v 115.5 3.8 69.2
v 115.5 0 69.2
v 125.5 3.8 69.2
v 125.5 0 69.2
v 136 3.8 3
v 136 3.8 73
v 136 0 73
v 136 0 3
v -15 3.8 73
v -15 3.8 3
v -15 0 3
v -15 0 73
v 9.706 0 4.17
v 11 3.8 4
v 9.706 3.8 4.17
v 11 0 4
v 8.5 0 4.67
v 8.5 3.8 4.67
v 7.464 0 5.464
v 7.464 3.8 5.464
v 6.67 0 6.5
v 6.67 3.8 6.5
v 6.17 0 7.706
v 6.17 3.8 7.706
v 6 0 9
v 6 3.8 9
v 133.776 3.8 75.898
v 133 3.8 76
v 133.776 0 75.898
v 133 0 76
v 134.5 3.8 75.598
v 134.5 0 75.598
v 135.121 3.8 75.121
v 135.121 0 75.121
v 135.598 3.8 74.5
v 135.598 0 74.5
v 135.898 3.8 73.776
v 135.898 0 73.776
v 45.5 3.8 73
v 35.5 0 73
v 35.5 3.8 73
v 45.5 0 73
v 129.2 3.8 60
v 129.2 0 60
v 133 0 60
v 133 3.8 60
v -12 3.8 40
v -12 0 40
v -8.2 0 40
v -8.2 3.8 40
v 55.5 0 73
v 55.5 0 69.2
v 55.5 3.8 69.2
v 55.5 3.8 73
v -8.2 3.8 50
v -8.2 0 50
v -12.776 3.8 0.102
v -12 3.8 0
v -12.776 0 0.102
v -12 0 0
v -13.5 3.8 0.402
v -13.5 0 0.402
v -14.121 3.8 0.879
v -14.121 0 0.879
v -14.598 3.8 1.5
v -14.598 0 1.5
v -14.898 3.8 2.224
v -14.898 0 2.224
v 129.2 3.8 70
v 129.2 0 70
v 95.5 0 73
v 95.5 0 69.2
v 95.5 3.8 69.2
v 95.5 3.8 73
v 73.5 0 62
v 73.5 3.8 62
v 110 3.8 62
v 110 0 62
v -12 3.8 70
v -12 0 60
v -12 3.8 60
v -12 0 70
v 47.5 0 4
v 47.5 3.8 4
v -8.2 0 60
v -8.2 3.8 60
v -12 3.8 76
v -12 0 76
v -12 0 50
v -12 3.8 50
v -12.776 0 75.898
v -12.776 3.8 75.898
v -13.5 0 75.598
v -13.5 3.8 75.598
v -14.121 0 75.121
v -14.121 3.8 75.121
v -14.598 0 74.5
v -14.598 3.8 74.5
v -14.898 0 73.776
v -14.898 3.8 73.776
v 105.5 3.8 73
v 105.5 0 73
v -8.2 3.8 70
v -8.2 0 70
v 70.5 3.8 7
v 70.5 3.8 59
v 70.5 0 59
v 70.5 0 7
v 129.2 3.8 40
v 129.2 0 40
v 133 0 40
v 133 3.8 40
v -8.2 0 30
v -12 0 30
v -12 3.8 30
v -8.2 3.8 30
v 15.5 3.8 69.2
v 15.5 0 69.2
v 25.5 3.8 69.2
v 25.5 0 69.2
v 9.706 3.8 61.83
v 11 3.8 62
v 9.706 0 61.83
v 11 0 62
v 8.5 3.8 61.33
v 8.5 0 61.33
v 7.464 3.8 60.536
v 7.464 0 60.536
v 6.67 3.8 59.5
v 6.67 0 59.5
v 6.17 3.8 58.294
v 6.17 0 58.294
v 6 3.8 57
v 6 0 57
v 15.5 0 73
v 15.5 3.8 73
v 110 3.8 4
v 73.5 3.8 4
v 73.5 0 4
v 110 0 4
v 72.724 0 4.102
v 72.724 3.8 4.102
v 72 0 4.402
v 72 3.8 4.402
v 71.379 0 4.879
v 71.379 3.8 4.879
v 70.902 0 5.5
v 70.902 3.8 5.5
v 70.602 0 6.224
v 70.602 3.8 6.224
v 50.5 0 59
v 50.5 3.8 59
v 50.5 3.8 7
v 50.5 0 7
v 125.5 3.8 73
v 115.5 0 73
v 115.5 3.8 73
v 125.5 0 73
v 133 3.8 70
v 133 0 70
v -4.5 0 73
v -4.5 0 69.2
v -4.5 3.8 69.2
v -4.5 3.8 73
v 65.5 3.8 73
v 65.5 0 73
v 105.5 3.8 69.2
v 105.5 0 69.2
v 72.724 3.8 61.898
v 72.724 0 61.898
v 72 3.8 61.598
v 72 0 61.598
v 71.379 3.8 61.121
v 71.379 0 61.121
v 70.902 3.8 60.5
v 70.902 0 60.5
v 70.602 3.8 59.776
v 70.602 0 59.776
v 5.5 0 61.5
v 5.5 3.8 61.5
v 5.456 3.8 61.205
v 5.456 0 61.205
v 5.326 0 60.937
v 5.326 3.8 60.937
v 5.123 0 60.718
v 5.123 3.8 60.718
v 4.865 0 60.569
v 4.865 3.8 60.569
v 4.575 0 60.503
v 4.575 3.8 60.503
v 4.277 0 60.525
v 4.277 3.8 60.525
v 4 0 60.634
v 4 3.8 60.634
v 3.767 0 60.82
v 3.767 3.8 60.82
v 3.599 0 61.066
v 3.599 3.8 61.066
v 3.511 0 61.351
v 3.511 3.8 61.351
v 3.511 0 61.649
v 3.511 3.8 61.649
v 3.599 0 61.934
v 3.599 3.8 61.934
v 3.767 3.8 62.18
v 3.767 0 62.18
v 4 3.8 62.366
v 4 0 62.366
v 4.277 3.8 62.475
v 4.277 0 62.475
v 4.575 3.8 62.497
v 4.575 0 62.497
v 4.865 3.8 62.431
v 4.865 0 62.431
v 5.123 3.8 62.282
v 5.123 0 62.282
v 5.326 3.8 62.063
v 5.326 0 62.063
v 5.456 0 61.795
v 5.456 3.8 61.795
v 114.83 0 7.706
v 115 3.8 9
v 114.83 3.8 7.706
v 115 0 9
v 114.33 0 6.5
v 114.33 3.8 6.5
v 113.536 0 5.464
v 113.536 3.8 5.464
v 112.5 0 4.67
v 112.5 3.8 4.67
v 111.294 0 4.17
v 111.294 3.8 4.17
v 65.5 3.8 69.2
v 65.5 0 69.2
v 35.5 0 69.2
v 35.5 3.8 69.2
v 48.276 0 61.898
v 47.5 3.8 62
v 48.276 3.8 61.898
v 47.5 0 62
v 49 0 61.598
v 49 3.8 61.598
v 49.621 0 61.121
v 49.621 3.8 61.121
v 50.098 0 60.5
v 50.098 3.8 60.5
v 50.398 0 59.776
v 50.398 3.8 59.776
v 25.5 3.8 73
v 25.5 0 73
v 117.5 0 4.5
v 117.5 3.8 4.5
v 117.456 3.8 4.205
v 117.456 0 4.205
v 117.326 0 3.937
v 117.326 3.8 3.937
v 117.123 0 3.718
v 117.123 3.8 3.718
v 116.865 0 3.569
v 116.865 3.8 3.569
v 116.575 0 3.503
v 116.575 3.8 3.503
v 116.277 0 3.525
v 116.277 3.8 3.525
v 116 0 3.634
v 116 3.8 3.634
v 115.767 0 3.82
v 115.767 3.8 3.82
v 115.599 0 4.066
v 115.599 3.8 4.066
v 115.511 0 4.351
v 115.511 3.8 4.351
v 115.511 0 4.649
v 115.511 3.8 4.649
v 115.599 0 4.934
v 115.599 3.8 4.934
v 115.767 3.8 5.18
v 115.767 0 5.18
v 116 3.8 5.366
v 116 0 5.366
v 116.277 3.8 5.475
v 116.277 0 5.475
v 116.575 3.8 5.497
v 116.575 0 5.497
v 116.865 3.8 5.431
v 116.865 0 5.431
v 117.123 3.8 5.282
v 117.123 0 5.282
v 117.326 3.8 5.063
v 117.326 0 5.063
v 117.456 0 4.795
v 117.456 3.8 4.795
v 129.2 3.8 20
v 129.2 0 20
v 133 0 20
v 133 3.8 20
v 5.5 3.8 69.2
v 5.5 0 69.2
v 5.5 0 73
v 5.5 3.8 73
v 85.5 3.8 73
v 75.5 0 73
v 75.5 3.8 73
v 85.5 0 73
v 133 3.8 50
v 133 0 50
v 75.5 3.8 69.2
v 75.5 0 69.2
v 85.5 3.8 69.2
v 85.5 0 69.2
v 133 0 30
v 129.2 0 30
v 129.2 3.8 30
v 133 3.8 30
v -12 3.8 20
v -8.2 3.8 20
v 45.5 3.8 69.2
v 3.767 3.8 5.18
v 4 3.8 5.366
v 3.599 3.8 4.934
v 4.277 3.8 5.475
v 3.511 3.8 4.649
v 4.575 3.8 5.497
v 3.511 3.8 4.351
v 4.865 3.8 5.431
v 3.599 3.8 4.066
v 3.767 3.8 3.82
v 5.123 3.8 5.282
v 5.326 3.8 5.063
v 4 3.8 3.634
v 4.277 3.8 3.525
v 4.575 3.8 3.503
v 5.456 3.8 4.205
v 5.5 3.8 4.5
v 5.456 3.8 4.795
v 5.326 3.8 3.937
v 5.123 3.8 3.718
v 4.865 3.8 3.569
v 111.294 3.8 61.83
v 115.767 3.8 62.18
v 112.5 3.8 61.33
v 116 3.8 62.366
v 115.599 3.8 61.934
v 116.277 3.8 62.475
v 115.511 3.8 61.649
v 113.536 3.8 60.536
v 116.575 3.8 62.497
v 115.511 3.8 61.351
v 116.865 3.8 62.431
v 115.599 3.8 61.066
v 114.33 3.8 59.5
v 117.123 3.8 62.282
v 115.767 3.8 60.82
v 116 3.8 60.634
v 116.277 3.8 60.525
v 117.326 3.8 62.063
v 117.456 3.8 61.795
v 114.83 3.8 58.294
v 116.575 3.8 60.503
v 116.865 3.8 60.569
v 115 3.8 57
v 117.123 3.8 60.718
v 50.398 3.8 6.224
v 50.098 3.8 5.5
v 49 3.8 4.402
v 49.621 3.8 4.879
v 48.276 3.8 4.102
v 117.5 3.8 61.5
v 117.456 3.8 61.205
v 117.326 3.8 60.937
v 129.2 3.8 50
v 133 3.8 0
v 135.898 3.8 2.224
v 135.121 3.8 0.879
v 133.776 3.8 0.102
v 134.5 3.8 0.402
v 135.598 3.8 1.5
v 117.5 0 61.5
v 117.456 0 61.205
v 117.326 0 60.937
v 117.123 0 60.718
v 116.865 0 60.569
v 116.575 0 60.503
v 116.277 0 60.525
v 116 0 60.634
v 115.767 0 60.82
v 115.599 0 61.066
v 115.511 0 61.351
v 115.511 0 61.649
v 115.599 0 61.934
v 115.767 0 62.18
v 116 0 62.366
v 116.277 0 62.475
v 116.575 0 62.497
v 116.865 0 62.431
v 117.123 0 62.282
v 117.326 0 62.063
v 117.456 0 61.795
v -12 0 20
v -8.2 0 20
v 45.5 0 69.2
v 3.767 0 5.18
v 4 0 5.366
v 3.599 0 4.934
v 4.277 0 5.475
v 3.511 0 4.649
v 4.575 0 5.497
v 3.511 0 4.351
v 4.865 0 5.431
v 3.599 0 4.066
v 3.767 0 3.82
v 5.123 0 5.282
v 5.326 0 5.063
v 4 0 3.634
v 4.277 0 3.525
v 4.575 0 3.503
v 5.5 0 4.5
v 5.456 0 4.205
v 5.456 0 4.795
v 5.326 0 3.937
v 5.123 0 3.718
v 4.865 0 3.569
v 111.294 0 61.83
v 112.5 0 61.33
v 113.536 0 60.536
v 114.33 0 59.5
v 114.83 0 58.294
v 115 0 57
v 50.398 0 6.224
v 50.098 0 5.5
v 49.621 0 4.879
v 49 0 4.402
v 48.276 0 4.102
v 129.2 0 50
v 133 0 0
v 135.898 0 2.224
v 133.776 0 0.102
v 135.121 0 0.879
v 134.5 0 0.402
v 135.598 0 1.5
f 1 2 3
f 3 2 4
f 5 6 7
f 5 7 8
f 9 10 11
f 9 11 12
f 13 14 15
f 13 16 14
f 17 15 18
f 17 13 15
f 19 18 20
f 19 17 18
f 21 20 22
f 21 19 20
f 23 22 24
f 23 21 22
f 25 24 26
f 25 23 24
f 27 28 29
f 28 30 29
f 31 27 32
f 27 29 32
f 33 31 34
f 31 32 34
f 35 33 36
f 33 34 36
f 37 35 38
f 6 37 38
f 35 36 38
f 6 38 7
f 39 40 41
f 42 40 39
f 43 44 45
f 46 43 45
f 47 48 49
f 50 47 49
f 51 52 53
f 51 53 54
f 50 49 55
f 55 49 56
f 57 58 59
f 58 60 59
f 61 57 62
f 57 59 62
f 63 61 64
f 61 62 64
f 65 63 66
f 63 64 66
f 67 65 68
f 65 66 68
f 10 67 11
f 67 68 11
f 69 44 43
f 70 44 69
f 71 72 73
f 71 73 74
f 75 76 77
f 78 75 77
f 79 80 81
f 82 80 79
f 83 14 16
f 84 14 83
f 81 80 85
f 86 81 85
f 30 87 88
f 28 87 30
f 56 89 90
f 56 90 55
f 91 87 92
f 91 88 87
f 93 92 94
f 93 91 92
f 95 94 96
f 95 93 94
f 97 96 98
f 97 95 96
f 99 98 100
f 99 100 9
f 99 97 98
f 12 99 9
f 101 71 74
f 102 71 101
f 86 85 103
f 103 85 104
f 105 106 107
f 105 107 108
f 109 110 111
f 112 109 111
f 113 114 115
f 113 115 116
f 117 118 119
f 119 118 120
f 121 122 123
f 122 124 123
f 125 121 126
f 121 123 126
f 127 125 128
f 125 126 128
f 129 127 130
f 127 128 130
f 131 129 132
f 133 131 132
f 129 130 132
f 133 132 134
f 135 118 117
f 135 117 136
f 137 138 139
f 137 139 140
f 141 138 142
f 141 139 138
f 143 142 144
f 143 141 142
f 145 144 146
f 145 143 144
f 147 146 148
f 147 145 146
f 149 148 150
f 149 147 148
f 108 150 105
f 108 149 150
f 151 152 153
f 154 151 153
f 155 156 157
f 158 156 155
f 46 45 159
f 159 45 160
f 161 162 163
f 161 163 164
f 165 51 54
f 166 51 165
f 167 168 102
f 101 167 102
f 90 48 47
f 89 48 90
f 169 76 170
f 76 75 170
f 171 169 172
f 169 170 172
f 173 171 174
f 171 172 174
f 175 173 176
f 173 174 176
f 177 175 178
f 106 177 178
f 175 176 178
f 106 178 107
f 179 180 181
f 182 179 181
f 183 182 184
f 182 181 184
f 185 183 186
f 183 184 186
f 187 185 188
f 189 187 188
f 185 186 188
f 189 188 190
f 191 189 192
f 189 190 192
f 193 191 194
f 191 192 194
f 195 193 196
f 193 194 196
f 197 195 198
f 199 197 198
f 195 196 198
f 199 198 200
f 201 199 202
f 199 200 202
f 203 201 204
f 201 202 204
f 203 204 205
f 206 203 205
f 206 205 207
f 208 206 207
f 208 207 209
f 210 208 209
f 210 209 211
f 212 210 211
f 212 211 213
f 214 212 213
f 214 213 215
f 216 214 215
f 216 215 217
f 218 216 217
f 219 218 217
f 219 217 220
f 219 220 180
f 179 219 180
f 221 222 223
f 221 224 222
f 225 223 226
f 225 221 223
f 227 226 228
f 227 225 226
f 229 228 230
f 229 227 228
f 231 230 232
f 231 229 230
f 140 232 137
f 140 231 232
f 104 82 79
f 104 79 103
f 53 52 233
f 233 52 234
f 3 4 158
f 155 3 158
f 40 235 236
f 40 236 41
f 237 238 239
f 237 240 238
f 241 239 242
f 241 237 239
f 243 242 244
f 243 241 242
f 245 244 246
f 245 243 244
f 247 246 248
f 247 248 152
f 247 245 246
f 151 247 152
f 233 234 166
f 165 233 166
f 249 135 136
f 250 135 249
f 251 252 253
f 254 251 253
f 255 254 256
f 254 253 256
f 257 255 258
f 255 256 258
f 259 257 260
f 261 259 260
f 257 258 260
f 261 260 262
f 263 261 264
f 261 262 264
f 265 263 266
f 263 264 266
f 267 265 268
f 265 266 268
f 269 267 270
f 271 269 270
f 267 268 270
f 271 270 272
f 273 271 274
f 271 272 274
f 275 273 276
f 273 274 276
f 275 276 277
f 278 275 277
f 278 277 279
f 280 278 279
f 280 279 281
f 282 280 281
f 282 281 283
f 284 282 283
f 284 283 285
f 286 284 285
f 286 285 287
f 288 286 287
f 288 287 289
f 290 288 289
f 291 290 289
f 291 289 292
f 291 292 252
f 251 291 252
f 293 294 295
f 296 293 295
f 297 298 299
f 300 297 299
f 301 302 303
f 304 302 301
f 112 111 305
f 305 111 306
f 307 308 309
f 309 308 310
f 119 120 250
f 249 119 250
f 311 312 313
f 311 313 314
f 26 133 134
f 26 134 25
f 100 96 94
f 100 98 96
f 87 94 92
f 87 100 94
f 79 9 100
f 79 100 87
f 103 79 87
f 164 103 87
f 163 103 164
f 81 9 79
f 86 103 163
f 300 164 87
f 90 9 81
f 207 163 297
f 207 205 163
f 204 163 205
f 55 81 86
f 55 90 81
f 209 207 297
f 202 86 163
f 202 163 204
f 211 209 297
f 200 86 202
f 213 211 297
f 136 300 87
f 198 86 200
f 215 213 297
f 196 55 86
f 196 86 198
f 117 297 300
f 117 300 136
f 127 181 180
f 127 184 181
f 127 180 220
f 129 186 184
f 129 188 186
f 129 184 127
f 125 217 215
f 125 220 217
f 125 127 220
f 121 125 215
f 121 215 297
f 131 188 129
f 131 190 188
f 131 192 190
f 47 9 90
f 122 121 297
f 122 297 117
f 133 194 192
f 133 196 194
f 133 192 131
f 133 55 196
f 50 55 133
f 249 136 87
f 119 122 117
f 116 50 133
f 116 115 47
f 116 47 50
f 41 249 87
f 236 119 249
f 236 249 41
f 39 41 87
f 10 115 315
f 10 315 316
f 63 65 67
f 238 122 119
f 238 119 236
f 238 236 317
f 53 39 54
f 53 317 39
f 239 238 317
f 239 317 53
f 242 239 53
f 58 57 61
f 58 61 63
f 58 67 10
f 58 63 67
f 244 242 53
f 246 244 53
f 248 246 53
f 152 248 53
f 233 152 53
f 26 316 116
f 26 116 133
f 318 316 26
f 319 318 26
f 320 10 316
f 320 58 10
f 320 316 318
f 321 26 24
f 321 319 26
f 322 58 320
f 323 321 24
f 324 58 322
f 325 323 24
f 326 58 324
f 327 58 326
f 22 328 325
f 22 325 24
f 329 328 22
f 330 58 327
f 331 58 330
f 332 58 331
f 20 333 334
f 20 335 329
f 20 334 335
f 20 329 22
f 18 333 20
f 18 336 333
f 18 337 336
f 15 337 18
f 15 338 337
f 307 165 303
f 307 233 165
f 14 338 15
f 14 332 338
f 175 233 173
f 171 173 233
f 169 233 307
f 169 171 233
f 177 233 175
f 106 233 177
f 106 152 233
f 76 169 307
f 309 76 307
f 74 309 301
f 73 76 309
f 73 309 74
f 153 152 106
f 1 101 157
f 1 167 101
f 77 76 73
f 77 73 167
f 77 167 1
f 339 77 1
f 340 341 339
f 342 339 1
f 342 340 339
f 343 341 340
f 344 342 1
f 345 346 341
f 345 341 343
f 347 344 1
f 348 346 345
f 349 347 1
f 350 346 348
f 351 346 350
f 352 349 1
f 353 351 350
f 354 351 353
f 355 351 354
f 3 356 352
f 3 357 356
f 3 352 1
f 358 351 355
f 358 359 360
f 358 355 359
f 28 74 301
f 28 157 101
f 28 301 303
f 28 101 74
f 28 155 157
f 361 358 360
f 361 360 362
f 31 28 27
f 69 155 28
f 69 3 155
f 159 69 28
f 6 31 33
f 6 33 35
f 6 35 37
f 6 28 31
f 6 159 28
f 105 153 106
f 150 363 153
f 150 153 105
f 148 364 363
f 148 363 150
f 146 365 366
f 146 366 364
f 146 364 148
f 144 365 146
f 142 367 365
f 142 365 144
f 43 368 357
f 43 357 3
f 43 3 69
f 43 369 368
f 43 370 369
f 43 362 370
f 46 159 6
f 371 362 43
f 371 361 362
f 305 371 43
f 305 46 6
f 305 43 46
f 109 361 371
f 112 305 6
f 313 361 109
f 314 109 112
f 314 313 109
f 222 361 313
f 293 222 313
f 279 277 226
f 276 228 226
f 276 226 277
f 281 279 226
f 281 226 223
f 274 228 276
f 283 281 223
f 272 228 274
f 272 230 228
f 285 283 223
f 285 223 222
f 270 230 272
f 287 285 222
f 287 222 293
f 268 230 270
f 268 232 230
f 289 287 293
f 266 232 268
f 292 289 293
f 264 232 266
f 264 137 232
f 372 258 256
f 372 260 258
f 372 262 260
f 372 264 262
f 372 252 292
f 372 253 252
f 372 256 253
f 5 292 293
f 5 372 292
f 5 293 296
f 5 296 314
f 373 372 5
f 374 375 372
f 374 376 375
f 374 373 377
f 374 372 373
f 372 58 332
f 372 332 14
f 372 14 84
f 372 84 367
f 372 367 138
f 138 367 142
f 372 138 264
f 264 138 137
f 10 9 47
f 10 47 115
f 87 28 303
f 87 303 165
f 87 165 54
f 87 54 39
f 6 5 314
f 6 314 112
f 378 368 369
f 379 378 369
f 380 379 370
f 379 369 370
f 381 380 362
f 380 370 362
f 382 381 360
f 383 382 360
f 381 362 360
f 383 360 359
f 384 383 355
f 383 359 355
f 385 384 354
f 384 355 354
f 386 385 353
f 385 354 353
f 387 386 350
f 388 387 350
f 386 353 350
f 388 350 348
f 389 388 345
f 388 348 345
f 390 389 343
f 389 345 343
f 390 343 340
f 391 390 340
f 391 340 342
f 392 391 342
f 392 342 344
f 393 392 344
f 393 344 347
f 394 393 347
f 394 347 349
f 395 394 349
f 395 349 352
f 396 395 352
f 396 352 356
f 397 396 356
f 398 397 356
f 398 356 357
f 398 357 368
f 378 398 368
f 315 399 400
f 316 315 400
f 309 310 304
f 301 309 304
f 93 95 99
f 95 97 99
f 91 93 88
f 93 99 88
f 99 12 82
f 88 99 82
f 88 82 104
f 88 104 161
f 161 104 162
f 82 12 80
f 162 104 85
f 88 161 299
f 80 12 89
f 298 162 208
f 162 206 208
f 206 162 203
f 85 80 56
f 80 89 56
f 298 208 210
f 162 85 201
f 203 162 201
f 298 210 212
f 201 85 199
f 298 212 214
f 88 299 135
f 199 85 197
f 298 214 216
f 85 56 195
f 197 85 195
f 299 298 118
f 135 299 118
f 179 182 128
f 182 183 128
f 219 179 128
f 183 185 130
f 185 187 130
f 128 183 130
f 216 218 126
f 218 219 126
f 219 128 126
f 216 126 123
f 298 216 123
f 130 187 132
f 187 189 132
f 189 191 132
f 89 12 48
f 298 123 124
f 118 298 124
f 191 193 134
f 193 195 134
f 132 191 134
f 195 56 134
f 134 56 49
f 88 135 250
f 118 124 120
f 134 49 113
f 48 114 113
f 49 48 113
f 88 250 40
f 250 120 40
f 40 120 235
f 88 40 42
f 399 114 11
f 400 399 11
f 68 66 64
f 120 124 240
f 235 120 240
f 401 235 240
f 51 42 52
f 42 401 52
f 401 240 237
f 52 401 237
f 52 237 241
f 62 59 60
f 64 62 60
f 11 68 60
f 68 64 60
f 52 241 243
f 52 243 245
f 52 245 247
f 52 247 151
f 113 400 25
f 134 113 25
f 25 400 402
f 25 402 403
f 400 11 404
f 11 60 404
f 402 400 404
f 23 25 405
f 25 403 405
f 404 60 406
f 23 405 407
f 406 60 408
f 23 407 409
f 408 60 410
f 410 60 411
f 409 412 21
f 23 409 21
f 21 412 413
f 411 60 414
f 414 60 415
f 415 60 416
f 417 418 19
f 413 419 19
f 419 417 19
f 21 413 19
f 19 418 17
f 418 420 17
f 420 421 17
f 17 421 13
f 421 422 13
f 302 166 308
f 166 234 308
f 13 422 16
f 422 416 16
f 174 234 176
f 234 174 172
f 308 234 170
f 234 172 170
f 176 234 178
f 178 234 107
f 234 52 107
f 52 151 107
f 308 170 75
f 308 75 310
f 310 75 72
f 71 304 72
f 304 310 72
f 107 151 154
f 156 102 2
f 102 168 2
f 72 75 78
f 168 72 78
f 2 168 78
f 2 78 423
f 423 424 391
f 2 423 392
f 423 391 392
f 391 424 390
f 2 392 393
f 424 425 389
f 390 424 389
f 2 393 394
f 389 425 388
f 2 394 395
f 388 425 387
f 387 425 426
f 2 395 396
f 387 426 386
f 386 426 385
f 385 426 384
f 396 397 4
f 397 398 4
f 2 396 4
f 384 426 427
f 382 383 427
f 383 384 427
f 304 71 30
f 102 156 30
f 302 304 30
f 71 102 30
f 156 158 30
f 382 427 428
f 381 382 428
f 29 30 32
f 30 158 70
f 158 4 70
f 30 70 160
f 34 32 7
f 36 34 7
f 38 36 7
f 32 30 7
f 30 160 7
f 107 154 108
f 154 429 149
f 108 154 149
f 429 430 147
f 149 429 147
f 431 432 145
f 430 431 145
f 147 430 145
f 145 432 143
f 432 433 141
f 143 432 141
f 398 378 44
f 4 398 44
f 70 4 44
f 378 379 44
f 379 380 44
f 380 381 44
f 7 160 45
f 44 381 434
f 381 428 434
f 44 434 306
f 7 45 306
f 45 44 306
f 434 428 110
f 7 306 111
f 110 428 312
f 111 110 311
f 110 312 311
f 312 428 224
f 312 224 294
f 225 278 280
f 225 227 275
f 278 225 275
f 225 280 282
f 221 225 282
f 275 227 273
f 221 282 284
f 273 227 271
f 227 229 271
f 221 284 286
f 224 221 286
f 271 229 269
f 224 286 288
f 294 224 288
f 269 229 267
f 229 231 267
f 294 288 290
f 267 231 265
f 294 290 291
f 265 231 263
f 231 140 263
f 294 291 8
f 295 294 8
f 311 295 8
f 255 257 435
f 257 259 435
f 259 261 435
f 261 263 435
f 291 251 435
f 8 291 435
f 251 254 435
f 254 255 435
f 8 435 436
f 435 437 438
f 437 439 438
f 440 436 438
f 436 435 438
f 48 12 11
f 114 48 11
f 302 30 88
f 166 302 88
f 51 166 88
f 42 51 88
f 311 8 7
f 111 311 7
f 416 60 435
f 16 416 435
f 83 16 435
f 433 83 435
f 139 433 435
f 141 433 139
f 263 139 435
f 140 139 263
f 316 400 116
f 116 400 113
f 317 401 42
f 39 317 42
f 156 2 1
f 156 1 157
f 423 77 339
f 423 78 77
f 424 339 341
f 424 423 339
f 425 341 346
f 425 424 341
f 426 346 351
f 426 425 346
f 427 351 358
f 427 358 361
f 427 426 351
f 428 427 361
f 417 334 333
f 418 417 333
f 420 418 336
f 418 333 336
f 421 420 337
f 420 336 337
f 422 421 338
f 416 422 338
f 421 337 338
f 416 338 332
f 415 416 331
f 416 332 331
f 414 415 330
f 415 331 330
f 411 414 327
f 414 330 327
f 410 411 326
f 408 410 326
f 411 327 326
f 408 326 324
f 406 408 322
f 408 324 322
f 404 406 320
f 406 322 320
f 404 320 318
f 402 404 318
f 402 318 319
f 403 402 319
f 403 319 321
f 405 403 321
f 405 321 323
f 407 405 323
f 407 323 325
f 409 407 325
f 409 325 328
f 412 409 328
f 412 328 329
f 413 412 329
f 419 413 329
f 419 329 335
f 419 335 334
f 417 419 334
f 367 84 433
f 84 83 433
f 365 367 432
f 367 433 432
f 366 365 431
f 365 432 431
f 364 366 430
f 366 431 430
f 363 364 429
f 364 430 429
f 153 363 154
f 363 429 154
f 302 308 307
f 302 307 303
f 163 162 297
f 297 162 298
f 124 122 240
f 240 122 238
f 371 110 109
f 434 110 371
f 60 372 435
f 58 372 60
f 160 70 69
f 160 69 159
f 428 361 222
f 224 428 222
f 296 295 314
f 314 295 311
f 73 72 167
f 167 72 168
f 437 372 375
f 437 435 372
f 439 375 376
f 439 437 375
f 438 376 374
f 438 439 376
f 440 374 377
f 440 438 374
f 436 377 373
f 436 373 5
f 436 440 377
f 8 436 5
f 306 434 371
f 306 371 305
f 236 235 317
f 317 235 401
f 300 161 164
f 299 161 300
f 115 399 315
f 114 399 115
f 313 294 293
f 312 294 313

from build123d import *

# Parameters (mm, degrees)
SKETCH1_W           = 121
SKETCH1_H           = 66
BOSS_EXTRUDE1_DEPTH = 3.8
SKETCH2_W           = 109
SKETCH2_H           = 58
CUT_EXTRUDE1_DEPTH  = 4.8
FILLET1_R           = 5
SKETCH3_W           = 20
SKETCH3_H           = 58
BOSS_EXTRUDE2_DEPTH = 3.8
FILLET2_R           = 3
SKETCH4_R           = 1
CUT_EXTRUDE2_DEPTH  = 4.8
BOSS_EXTRUDE3_DEPTH = 3.8
FILLET3_R           = 3
SKETCH6_W           = 3.8
SKETCH6_H           = 10
SKETCH6_W_2         = 10
SKETCH6_H_2         = 3.8
CUT_EXTRUDE3_DEPTH  = 4.8


with BuildPart() as part:
    # Sketch1 → Boss-Extrude1 (new body)
    with BuildSketch(Plane(origin=(0, 0, 0), x_dir=(1, 0, 0), z_dir=(0, 1, 0))):
        with Locations((60.5, -33)):
            Rectangle(SKETCH1_W, SKETCH1_H)
    extrude(amount=BOSS_EXTRUDE1_DEPTH)

    # Sketch2 → Cut-Extrude1 (cut, through all)
    with BuildSketch(Plane(origin=(0, 3.8, 0), x_dir=(1, 0, 0), z_dir=(0, 1, 0))):
        with Locations((60.5, -33)):
            Rectangle(SKETCH2_W, SKETCH2_H)
    extrude(amount=-CUT_EXTRUDE1_DEPTH, mode=Mode.SUBTRACT)

    # Fillet1
    fillet1_edges = [part.edges().sort_by_distance(p)[0] for p in [
        (115, 1.9, 4),
        (115, 1.9, 62),
        (6, 1.9, 62),
        (6, 1.9, 4),
    ]]
    fillet(fillet1_edges, radius=FILLET1_R)

    # Sketch3 → Boss-Extrude2 (add, through all)
    with BuildSketch(Plane(origin=(0, 3.8, 0), x_dir=(1, 0, 0), z_dir=(0, 1, 0))):
        with Locations((60.5, -33)):
            Rectangle(SKETCH3_W, SKETCH3_H)
    extrude(amount=-BOSS_EXTRUDE2_DEPTH)

    # Fillet2
    fillet2_edges = [part.edges().sort_by_distance(p)[0] for p in [
        (70.5, 1.9, 4),
        (70.5, 1.9, 62),
        (50.5, 1.9, 62),
        (50.5, 1.9, 4),
    ]]
    fillet(fillet2_edges, radius=FILLET2_R)

    # Sketch4 → Cut-Extrude2 (cut, through all)
    with BuildSketch(Plane(origin=(0, 3.8, 0), x_dir=(1, 0, 0), z_dir=(0, 1, 0))):
        with Locations((116.5, -61.5)):
            Circle(SKETCH4_R)
        with Locations((116.5, -4.5)):
            Circle(SKETCH4_R)
        with Locations((4.5, -4.5)):
            Circle(SKETCH4_R)
        with Locations((4.5, -61.5)):
            Circle(SKETCH4_R)
    extrude(amount=-CUT_EXTRUDE2_DEPTH, mode=Mode.SUBTRACT)

    # Sketch5 → Boss-Extrude3 (add, through all)
    with BuildSketch(Plane(origin=(0, 3.8, 0), x_dir=(1, 0, 0), z_dir=(0, 1, 0))):
        Polygon((0, 0), (-15, 0), (-15, -76), (136, -76), (136, 0), (121, 0), (121, -66), (0, -66), align=None)
    extrude(amount=-BOSS_EXTRUDE3_DEPTH)

    # Fillet3
    fillet3_edges = [part.edges().sort_by_distance(p)[0] for p in [
        (136, 1.9, 0),
        (136, 1.9, 76),
        (-15, 1.9, 76),
        (-15, 1.9, 0),
    ]]
    fillet(fillet3_edges, radius=FILLET3_R)

    # Sketch6 → Cut-Extrude3 (cut, through all)
    with BuildSketch(Plane.XZ):
        with Locations((131.1, 25)):
            Rectangle(SKETCH6_W, SKETCH6_H)
        with Locations((131.1, 45)):
            Rectangle(SKETCH6_W, SKETCH6_H)
        with Locations((131.1, 65)):
            Rectangle(SKETCH6_W, SKETCH6_H)
        with Locations((120.5, 71.1)):
            Rectangle(SKETCH6_W_2, SKETCH6_H_2)
        with Locations((100.5, 71.1)):
            Rectangle(SKETCH6_W_2, SKETCH6_H_2)
        with Locations((80.5, 71.1)):
            Rectangle(SKETCH6_W_2, SKETCH6_H_2)
        with Locations((60.5, 71.1)):
            Rectangle(SKETCH6_W_2, SKETCH6_H_2)
        with Locations((40.5, 71.1)):
            Rectangle(SKETCH6_W_2, SKETCH6_H_2)
        with Locations((20.5, 71.1)):
            Rectangle(SKETCH6_W_2, SKETCH6_H_2)
        with Locations((0.5, 71.1)):
            Rectangle(SKETCH6_W_2, SKETCH6_H_2)
        with Locations((-10.1, 65)):
            Rectangle(SKETCH6_W, SKETCH6_H)
        with Locations((-10.1, 45)):
            Rectangle(SKETCH6_W, SKETCH6_H)
        with Locations((-10.1, 25)):
            Rectangle(SKETCH6_W, SKETCH6_H)
    extrude(amount=-CUT_EXTRUDE3_DEPTH, mode=Mode.SUBTRACT)


solid = part.part
